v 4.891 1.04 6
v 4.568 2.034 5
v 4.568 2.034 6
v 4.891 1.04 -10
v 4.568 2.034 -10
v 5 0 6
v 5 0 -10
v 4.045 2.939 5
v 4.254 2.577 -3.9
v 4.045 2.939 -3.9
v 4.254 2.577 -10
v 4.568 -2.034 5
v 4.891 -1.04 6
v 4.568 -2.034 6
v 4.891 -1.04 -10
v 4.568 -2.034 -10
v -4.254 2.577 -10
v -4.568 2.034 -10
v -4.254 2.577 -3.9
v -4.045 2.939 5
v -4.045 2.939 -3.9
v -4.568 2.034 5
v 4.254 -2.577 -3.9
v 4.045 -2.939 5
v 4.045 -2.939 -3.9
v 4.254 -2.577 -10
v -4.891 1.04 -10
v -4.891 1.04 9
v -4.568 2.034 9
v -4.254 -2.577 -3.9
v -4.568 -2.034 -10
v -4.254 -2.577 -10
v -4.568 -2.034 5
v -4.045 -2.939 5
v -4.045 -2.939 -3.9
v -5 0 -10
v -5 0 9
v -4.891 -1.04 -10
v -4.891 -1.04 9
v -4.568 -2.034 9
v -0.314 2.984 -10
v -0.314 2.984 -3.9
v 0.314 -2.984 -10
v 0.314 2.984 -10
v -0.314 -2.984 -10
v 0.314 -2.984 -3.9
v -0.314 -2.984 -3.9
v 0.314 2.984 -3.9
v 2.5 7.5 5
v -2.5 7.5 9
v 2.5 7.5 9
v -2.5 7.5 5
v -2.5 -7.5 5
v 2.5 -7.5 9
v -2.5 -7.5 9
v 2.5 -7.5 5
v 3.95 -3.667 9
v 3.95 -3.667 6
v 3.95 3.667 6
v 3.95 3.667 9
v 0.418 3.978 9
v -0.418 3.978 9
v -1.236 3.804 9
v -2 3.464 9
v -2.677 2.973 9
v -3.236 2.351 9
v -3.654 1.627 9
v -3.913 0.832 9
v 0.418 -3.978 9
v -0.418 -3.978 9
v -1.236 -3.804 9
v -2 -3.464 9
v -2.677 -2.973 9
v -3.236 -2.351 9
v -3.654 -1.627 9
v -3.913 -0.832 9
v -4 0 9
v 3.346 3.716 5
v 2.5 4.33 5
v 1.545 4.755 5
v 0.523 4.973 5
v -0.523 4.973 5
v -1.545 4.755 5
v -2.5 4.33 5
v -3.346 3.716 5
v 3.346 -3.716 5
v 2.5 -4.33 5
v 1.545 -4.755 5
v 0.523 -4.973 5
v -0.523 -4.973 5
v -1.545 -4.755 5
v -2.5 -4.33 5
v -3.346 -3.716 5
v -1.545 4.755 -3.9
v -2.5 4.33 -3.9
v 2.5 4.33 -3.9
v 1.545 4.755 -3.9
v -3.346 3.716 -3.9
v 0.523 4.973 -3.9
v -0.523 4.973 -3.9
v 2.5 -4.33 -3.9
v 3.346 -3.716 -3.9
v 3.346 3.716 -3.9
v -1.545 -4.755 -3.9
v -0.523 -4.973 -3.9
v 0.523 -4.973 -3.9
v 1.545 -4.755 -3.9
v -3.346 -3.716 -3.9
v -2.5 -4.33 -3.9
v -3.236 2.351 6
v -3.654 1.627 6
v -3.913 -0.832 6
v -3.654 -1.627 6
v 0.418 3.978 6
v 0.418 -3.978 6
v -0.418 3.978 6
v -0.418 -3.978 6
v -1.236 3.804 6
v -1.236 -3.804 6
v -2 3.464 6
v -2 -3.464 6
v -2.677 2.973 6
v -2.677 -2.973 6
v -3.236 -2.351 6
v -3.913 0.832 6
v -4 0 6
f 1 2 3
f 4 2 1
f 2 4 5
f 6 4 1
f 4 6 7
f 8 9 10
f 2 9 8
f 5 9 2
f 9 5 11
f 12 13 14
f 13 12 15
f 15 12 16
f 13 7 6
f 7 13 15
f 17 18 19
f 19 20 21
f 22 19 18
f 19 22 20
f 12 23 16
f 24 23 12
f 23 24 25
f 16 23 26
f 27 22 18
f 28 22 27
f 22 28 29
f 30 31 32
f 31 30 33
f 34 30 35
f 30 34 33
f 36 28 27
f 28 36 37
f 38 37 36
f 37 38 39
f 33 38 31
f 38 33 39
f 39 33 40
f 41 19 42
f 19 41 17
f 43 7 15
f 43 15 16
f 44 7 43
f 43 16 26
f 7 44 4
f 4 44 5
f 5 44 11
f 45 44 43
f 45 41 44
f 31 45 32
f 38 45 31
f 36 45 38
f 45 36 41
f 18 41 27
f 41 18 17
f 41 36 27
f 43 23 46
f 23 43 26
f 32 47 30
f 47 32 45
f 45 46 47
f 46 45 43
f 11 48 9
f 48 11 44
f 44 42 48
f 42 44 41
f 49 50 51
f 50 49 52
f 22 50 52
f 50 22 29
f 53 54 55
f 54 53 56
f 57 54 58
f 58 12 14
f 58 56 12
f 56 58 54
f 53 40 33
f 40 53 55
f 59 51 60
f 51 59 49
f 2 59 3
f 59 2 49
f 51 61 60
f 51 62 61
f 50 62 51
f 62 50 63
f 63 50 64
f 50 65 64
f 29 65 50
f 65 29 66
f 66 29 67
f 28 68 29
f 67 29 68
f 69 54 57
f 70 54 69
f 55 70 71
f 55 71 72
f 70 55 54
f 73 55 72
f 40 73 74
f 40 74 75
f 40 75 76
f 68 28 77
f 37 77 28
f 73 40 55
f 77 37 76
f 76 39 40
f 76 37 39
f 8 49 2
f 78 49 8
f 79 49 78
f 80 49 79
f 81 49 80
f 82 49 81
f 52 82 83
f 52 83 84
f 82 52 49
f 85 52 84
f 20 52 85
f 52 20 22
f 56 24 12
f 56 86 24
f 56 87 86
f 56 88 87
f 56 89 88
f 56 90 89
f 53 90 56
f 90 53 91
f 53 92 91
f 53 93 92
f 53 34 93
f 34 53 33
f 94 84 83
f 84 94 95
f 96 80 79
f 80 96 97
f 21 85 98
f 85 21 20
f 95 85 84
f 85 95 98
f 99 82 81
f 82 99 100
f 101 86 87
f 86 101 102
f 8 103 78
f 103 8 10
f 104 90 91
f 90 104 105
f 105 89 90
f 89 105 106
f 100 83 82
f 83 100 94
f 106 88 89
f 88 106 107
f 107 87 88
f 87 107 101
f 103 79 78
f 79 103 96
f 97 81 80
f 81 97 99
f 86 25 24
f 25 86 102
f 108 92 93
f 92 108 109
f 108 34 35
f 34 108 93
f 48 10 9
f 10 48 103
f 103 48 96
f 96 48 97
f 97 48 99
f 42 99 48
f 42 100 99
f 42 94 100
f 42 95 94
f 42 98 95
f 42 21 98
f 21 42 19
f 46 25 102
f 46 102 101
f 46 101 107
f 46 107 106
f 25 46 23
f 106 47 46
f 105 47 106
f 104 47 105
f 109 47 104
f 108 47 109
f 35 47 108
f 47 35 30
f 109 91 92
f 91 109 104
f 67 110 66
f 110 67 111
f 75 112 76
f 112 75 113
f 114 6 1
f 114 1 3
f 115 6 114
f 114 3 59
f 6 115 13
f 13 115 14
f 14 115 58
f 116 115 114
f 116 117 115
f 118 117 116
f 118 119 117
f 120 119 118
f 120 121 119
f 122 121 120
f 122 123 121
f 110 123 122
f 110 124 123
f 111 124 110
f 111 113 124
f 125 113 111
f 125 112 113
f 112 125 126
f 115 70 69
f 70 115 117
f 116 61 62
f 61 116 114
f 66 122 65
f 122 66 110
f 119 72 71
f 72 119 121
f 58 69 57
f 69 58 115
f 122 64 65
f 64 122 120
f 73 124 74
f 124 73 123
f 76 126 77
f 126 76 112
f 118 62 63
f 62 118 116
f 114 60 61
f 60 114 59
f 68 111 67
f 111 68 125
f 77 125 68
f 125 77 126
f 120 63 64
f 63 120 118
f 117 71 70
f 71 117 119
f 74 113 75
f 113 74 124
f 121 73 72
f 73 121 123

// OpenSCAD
$fs=0.5;

module servo_connection_rod() {
    difference() {
        union() {
            hull(){
                    translate([0,0,7])
                    cube([5,15,4],center=true);
                    translate([0,0,5])
                    cylinder(r=5, h=4);
                }
            
            difference() {
                
                 hull(){
                    translate([0,0,-6.5])
                    cube([10,5,7],center=true);
                    translate([0,0,-10])
                    cylinder(r=3, h=7);
                }
                
                translate([0,0,-11])
                difference() {
                    cylinder(r=10, h=10);
                    cylinder(r=5, h=10);
                }
            }
            translate([0,0,-3.9])
            cylinder(r=5, h=9);
        }
        
        //servo horn
        translate([0,0,6])
        hull(){
            cylinder(d=8, h=9);
            translate([17.1,0,0])
            cylinder(d=5,h=9);
        }
    } 
}

//rotate([0,-90,0])
servo_connection_rod();
